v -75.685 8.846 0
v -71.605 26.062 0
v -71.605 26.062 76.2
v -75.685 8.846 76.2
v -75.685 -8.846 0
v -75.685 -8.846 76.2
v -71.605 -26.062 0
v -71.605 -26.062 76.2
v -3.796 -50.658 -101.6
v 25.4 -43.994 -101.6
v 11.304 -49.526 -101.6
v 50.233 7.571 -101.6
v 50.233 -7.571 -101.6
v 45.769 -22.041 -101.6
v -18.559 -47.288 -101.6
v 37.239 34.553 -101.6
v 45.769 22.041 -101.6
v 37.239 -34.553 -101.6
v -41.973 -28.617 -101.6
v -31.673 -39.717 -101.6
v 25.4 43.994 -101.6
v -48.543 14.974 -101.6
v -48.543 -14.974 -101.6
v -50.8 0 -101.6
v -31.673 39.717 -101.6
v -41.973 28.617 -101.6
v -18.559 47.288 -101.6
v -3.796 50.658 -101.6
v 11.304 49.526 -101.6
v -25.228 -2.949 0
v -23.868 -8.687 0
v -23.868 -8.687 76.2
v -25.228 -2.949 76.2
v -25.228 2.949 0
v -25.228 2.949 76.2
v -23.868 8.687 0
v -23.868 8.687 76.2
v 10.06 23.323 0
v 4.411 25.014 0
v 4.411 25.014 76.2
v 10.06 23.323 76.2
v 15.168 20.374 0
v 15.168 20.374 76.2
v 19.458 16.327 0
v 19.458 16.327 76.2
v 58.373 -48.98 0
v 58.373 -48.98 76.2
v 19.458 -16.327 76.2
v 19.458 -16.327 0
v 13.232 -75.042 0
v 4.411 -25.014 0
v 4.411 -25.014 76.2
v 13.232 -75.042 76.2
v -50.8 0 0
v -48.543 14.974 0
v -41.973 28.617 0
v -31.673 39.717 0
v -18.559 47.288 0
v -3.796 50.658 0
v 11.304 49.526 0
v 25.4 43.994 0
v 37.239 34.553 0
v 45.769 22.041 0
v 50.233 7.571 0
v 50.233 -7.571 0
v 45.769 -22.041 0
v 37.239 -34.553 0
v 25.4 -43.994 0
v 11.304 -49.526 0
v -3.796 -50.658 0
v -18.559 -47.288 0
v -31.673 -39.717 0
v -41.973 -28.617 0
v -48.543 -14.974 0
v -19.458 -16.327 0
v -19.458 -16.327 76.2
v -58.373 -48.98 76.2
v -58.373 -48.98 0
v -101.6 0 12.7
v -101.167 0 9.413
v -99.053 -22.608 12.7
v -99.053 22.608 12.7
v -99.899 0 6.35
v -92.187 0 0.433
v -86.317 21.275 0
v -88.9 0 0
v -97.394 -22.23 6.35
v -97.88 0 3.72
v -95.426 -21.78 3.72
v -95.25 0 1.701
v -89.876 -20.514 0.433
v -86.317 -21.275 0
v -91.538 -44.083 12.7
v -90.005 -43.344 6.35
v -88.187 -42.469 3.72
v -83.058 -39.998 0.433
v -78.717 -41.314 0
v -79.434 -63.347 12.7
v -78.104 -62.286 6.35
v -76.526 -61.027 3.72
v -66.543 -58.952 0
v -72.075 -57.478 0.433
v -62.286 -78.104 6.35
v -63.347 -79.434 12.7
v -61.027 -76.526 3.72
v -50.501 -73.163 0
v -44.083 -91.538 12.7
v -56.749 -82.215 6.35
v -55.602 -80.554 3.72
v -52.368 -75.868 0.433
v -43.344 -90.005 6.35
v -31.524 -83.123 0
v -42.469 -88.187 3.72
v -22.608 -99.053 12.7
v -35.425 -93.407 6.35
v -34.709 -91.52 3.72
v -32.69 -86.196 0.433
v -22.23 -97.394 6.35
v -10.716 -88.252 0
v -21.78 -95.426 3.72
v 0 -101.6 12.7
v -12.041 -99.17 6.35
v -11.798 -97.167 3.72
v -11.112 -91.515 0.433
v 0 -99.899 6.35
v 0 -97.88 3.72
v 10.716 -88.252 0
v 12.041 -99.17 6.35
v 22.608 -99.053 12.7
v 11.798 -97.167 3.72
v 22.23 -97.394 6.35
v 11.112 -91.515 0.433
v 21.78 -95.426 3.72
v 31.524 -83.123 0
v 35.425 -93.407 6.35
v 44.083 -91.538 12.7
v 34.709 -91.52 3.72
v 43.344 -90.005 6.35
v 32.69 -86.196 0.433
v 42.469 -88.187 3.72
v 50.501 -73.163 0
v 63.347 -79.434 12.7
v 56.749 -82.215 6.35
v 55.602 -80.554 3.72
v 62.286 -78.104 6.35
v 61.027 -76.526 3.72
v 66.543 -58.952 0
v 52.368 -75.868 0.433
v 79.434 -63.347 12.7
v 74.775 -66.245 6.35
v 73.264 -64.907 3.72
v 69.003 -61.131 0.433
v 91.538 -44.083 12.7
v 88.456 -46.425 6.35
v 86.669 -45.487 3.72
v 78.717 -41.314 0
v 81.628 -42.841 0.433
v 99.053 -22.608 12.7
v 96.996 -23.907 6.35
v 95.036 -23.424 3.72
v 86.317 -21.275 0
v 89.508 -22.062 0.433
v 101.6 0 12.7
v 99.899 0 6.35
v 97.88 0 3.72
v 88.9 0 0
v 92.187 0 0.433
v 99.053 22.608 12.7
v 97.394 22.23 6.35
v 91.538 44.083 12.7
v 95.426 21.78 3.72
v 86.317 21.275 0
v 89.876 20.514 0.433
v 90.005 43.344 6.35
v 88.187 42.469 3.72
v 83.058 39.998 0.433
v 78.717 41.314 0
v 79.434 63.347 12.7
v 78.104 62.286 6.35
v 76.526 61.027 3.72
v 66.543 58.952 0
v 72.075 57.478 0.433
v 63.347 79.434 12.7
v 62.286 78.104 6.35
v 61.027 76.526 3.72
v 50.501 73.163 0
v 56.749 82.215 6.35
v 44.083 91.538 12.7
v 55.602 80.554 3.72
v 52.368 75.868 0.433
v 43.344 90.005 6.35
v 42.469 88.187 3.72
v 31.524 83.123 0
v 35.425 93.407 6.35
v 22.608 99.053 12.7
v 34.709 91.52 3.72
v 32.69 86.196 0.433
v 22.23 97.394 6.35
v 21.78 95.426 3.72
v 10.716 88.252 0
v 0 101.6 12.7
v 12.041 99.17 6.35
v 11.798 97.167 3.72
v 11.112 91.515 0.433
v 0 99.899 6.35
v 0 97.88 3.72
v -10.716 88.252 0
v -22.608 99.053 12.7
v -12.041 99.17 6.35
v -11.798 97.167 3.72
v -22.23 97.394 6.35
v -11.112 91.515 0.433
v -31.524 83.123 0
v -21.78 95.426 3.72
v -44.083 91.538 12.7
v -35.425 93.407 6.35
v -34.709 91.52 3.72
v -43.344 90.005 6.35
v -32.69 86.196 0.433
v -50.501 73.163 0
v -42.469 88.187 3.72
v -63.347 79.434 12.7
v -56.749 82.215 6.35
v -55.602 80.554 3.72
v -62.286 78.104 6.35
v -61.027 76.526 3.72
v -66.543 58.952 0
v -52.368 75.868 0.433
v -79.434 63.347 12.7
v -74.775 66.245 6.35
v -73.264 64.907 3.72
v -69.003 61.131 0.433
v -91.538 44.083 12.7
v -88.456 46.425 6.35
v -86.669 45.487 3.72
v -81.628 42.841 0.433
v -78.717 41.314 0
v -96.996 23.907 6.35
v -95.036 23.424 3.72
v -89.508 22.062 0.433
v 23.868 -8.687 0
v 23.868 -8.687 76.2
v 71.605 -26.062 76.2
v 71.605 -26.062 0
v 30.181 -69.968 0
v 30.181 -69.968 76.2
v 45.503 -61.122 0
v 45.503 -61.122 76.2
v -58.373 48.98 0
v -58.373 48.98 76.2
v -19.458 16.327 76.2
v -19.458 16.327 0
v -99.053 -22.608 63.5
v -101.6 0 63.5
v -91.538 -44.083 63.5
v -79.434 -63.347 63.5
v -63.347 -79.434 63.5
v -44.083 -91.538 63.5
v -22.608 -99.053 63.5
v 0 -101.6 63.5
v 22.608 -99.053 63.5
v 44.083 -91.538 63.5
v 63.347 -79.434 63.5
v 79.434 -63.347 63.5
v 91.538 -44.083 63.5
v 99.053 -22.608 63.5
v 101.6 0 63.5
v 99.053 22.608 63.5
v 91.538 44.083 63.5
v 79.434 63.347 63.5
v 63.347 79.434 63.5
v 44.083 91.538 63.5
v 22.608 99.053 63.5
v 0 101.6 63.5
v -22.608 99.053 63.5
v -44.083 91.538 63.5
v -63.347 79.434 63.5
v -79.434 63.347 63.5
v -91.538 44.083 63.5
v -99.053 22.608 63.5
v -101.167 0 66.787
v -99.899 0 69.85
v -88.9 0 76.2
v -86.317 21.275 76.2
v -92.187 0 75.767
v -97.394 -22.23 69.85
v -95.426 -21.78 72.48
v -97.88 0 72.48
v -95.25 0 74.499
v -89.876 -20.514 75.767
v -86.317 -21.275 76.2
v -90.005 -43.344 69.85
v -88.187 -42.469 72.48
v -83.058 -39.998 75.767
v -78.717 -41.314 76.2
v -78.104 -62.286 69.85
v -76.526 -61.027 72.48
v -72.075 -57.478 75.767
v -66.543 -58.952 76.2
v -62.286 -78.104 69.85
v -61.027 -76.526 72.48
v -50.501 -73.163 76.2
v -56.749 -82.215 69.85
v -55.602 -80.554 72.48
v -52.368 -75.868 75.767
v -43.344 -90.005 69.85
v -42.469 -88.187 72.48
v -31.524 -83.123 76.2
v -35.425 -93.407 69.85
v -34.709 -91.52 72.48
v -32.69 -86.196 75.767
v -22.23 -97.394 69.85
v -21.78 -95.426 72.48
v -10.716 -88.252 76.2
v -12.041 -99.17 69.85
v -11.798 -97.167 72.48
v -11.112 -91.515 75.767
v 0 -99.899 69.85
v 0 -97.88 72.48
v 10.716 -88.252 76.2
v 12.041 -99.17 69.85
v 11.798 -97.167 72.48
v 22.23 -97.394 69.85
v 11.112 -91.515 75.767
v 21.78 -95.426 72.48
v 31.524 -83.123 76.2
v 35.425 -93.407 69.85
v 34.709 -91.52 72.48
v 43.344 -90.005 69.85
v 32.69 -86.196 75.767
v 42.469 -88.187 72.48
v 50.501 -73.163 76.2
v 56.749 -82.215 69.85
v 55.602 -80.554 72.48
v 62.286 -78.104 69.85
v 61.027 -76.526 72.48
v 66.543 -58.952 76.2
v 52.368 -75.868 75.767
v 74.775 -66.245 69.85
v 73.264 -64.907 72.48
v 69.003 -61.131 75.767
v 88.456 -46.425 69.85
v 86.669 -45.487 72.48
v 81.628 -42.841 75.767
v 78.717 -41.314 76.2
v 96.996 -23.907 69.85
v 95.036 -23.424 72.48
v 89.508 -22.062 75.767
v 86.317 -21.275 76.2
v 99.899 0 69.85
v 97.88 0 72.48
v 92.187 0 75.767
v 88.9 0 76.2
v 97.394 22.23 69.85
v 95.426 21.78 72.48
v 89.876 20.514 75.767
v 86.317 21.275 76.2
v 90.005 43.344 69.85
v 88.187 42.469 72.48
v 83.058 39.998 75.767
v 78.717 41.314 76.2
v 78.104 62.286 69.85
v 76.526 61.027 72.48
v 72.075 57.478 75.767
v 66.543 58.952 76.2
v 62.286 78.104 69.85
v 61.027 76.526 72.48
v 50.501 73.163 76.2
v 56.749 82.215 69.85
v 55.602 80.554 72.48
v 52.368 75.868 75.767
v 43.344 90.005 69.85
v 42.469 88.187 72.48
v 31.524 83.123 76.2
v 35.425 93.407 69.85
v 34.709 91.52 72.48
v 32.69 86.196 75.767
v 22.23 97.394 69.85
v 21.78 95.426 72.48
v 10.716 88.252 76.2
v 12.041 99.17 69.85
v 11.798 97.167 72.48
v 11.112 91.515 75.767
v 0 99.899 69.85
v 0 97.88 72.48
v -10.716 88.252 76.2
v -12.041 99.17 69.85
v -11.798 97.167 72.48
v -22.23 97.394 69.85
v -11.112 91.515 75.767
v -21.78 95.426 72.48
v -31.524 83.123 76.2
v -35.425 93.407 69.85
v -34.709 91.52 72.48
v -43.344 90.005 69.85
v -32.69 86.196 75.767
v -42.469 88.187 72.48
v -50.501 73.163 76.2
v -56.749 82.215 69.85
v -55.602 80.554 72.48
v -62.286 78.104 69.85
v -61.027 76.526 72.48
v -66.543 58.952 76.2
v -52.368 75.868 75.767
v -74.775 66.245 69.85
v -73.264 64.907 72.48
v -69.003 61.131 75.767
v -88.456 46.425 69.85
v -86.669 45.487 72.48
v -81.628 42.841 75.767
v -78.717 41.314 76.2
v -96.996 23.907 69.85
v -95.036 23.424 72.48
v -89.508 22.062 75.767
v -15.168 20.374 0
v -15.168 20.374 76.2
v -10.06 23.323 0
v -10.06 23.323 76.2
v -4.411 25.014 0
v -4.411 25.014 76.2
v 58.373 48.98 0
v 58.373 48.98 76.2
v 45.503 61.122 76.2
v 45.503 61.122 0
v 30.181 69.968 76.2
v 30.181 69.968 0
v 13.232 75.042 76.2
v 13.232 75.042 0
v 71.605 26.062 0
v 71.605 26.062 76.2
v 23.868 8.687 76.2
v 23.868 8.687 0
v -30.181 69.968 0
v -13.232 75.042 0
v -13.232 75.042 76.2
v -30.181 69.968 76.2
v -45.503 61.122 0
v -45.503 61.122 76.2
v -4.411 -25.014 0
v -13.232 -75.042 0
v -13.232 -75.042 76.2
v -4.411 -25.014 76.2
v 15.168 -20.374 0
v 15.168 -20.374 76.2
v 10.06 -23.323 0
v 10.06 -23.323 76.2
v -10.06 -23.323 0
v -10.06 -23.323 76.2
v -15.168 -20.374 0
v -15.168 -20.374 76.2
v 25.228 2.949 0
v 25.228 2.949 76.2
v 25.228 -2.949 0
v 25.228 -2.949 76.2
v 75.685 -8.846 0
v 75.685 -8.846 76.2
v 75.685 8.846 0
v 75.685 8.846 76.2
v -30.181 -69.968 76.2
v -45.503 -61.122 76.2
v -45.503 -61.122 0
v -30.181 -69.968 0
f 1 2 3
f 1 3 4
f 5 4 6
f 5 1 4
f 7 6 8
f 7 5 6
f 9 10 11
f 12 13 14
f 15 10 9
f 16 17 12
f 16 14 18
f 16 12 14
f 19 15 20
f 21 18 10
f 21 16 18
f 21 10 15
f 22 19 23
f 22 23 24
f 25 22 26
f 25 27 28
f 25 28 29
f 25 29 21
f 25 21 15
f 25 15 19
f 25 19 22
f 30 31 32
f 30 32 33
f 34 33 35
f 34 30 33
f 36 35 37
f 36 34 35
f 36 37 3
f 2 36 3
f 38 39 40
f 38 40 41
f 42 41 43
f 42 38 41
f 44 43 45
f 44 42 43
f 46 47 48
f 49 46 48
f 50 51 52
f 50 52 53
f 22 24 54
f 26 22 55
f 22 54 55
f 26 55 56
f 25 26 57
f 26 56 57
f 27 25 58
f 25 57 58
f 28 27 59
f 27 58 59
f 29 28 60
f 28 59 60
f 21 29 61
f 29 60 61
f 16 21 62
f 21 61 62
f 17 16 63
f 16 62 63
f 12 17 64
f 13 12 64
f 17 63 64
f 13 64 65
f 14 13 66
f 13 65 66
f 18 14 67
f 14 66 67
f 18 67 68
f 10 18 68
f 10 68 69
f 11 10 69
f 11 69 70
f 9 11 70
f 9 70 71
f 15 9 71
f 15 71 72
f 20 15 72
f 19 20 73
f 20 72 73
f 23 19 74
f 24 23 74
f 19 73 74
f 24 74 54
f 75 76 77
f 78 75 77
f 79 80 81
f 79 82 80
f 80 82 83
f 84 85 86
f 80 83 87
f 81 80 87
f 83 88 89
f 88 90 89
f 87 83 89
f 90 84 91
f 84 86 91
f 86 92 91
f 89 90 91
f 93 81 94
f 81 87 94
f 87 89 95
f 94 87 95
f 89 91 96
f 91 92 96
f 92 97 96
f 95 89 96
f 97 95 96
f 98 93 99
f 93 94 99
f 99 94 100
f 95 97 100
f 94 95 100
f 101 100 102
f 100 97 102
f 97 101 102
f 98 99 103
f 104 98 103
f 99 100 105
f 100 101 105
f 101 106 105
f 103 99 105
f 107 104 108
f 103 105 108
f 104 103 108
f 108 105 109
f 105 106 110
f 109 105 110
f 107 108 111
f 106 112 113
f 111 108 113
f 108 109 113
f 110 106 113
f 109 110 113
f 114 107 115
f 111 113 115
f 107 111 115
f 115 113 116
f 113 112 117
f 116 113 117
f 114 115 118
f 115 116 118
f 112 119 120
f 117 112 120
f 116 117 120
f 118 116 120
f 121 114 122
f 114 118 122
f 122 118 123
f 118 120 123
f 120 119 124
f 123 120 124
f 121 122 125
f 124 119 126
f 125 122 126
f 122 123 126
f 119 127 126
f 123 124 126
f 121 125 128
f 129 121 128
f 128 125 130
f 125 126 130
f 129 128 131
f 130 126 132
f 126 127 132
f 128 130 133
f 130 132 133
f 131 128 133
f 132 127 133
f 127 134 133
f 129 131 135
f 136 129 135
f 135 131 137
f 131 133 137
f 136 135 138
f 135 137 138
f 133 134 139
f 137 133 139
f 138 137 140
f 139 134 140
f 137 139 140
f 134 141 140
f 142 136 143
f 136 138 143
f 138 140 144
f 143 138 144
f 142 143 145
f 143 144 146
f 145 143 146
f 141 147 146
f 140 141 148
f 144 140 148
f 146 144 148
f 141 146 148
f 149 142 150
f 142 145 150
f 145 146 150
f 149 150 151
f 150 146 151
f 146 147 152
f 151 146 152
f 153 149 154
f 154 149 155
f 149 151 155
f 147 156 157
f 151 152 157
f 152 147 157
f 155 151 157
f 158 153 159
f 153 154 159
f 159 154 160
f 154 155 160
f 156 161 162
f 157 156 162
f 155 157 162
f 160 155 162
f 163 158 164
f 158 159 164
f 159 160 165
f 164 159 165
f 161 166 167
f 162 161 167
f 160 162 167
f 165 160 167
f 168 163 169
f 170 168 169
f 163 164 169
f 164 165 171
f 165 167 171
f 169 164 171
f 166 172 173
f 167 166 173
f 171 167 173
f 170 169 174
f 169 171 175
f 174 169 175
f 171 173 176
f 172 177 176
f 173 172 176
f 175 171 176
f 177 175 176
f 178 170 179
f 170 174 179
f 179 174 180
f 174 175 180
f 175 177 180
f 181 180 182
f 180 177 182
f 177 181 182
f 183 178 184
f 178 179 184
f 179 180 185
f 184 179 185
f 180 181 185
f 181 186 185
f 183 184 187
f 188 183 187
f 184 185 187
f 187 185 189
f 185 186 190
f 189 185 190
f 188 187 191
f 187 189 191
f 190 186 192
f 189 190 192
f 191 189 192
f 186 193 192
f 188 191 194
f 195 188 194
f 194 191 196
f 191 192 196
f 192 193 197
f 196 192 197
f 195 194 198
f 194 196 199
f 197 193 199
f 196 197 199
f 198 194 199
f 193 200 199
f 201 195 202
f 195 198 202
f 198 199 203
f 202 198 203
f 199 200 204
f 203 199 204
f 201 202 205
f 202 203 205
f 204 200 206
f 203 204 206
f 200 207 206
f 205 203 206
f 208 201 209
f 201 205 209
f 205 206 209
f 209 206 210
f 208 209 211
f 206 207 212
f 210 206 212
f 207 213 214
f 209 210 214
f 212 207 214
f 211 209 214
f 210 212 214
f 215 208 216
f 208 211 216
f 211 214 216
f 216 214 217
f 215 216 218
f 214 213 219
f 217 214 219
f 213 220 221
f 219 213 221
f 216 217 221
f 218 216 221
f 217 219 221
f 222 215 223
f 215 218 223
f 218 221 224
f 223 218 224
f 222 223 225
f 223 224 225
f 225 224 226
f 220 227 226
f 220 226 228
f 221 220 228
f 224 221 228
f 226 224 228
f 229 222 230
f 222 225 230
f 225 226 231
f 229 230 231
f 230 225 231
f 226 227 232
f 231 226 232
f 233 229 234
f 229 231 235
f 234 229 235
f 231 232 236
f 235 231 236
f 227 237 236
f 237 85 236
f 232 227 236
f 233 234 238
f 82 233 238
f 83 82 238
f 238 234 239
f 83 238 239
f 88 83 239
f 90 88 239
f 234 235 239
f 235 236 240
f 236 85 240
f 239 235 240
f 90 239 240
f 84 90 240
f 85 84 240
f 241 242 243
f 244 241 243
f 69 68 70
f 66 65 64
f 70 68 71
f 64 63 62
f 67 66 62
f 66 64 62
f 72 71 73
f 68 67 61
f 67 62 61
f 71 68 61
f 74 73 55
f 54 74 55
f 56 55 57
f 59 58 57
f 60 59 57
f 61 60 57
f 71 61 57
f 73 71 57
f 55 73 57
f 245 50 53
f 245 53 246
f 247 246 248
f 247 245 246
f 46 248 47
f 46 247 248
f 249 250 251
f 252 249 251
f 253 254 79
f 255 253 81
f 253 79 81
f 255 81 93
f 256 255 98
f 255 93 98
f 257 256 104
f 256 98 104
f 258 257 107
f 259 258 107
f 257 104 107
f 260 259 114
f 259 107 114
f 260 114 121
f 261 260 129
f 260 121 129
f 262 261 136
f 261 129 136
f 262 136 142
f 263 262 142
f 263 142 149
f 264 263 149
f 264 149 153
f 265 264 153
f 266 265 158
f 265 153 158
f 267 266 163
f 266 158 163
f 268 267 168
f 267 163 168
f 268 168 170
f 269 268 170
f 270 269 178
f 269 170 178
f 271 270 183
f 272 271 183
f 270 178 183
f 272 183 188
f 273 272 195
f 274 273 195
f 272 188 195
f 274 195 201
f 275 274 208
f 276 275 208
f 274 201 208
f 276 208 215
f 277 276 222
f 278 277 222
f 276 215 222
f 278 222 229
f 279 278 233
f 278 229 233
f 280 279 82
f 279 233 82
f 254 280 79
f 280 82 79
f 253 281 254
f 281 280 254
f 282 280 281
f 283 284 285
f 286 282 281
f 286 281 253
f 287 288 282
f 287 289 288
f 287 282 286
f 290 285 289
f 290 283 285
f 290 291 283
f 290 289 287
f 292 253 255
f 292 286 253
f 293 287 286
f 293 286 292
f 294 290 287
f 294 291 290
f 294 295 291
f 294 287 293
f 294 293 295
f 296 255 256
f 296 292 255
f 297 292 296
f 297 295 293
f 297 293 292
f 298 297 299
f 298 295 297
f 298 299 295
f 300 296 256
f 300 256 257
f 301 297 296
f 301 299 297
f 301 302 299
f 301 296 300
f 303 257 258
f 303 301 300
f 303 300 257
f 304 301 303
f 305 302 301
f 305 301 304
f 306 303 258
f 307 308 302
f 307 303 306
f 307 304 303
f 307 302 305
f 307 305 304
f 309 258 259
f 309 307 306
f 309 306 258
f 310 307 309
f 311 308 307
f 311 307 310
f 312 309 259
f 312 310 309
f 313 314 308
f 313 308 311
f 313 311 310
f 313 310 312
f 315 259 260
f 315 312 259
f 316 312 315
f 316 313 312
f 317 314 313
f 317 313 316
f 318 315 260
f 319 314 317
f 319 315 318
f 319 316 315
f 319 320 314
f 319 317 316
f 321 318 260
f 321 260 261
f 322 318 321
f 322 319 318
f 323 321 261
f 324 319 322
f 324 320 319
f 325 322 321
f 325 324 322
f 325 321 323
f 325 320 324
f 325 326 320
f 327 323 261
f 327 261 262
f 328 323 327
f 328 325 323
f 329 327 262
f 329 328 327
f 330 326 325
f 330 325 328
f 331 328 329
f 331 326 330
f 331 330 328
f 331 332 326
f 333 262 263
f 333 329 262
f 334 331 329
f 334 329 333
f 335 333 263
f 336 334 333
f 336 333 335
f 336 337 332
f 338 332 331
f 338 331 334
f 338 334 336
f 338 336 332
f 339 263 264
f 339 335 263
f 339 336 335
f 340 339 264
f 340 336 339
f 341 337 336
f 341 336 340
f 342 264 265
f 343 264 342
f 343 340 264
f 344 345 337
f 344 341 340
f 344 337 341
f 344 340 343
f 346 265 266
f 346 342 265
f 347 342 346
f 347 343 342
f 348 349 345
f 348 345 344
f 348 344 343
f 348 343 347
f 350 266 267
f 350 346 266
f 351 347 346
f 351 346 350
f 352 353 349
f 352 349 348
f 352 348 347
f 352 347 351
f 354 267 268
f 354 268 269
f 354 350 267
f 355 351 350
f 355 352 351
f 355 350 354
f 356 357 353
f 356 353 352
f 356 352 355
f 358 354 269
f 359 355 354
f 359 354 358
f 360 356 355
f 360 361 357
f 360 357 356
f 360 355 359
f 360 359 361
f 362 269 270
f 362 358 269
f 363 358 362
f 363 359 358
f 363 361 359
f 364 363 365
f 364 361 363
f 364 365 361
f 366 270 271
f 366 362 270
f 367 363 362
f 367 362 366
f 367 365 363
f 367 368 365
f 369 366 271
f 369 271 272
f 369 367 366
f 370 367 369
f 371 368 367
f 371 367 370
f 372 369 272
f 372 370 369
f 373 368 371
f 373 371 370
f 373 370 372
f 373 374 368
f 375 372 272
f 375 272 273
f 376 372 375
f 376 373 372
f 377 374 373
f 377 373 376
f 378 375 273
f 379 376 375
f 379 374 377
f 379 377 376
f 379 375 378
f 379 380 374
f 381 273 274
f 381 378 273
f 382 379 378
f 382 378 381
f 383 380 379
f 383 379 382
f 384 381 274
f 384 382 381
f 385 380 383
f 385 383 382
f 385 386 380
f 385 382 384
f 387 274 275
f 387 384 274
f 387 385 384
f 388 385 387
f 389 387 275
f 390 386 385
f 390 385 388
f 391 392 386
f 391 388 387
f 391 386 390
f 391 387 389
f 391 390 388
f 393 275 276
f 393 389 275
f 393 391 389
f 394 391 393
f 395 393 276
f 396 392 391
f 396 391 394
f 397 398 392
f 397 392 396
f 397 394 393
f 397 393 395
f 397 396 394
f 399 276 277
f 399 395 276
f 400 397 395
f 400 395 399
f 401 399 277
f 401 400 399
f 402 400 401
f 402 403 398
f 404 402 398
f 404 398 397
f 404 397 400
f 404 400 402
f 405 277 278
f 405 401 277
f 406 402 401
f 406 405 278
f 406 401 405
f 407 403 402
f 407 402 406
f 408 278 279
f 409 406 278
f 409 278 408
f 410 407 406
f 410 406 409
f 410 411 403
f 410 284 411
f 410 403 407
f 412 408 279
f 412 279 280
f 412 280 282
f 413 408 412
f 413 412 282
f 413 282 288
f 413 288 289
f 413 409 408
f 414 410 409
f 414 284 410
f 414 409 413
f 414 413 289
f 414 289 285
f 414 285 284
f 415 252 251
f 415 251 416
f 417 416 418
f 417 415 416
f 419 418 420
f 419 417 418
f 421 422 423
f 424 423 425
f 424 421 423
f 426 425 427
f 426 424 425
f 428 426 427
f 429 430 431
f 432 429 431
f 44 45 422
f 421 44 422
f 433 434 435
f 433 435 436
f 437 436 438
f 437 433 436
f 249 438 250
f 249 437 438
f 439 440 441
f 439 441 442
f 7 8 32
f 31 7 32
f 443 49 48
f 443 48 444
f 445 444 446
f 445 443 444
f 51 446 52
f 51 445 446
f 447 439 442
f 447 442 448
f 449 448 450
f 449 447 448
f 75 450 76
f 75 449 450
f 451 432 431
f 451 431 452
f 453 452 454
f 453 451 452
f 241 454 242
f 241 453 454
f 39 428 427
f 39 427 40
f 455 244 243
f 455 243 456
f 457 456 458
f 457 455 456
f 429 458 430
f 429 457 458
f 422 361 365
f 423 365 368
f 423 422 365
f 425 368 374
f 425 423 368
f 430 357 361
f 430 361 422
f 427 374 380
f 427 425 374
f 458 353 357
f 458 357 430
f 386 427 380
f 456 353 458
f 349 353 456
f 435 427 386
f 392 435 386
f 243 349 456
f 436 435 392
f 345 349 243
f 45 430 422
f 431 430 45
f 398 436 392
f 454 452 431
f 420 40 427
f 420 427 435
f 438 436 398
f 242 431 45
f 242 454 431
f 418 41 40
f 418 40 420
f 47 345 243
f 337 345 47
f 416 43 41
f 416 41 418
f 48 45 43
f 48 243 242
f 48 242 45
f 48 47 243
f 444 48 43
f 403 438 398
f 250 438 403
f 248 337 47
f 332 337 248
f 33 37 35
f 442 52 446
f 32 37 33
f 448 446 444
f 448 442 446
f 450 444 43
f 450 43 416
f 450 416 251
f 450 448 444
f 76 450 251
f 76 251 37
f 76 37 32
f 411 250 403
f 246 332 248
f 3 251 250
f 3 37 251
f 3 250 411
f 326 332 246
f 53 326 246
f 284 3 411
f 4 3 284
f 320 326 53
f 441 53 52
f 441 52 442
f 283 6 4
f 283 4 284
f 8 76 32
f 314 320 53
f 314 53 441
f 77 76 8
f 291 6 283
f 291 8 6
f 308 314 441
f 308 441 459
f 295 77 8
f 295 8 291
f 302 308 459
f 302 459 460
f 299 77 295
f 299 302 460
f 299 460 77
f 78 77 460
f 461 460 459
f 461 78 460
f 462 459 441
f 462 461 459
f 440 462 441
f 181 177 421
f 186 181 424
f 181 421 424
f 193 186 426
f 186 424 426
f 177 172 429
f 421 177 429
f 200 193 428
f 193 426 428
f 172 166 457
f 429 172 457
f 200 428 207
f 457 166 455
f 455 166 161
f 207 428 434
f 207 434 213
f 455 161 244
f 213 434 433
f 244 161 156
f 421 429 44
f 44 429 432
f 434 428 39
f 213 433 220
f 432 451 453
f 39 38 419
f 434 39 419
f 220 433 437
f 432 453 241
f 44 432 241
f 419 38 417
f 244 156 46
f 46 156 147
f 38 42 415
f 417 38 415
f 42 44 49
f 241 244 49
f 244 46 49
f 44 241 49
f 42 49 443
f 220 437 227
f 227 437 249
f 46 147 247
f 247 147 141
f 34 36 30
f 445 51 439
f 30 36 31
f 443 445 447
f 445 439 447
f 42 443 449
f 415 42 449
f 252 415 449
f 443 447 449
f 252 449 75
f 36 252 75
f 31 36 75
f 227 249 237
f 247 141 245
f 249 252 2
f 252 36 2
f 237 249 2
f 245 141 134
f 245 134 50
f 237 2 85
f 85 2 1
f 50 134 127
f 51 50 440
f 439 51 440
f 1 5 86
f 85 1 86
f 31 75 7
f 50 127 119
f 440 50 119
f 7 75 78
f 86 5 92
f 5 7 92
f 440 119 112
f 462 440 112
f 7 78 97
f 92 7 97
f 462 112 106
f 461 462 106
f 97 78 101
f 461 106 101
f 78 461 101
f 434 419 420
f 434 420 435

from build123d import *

# Parameters (mm, degrees)
SKETCH1_R           = 101.6
BOSS_EXTRUDE2_DEPTH = 76.2
CUT_EXTRUDE1_REACH  = 164.639
FILLET1_R           = 12.7
SKETCH6_R           = 50.8
BOSS_EXTRUDE4_DEPTH = 101.6


with BuildPart() as part:
    # Sketch1 → Boss-Extrude2 (new body)
    with BuildSketch(Plane.XY):
        with Locations(Location((0, 0, 0), (0, 0, 180))):
            Circle(SKETCH1_R)
    extrude(amount=BOSS_EXTRUDE2_DEPTH)

    # Sketch5 → Cut-Extrude1 (cut, up to next)
    with BuildSketch(Plane(origin=(0, 0, 0), x_dir=(-1, 0, 0), z_dir=(0, 0, -1)), mode=Mode.PRIVATE) as cut_extrude1_sk1:
        with BuildLine():
            Line((23.868192568, 8.68731164), (71.604577704, 26.061934921))
            ThreePointArc((71.604577704, 26.061934921), (76.2, 0), (71.604577704, -26.061934921))
            Line((71.604577704, -26.061934921), (23.868192568, -8.68731164))
            ThreePointArc((23.868192568, -8.68731164), (25.4, 0), (23.868192568, 8.68731164))
        make_face()
    cut_extrude1_tool1 = extrude(cut_extrude1_sk1.sketch, amount=-CUT_EXTRUDE1_REACH, mode=Mode.PRIVATE) & part.part
    # Sketch5 → Cut-Extrude1 (cut, up to next)
    with BuildSketch(Plane(origin=(0, 0, 0), x_dir=(-1, 0, 0), z_dir=(0, 0, -1)), mode=Mode.PRIVATE) as cut_extrude1_sk2:
        with BuildLine():
            Line((19.457528855, -16.326805286), (58.372586566, -48.980415858))
            ThreePointArc((58.372586566, -48.980415858), (38.1, -65.991135768), (13.231991138, -75.04235078))
            Line((13.231991138, -75.04235078), (4.410663713, -25.014116927))
            ThreePointArc((4.410663713, -25.014116927), (12.7, -21.997045256), (19.457528855, -16.326805286))
        make_face()
    cut_extrude1_tool2 = extrude(cut_extrude1_sk2.sketch, amount=-CUT_EXTRUDE1_REACH, mode=Mode.PRIVATE) & part.part
    # Sketch5 → Cut-Extrude1 (cut, up to next)
    with BuildSketch(Plane(origin=(0, 0, 0), x_dir=(-1, 0, 0), z_dir=(0, 0, -1)), mode=Mode.PRIVATE) as cut_extrude1_sk3:
        with BuildLine():
            Line((-4.410663713, -25.014116927), (-13.231991138, -75.04235078))
            ThreePointArc((-13.231991138, -75.04235078), (-38.1, -65.991135768), (-58.372586566, -48.980415858))
            Line((-58.372586566, -48.980415858), (-19.457528855, -16.326805286))
            ThreePointArc((-19.457528855, -16.326805286), (-12.7, -21.997045256), (-4.410663713, -25.014116927))
        make_face()
    cut_extrude1_tool3 = extrude(cut_extrude1_sk3.sketch, amount=-CUT_EXTRUDE1_REACH, mode=Mode.PRIVATE) & part.part
    # Sketch5 → Cut-Extrude1 (cut, up to next)
    with BuildSketch(Plane(origin=(0, 0, 0), x_dir=(-1, 0, 0), z_dir=(0, 0, -1)), mode=Mode.PRIVATE) as cut_extrude1_sk4:
        with BuildLine():
            Line((-23.868192568, -8.68731164), (-71.604577704, -26.061934921))
            ThreePointArc((-71.604577704, -26.061934921), (-76.2, 0), (-71.604577704, 26.061934921))
            Line((-71.604577704, 26.061934921), (-23.868192568, 8.68731164))
            ThreePointArc((-23.868192568, 8.68731164), (-25.4, 0), (-23.868192568, -8.68731164))
        make_face()
    cut_extrude1_tool4 = extrude(cut_extrude1_sk4.sketch, amount=-CUT_EXTRUDE1_REACH, mode=Mode.PRIVATE) & part.part
    # Sketch5 → Cut-Extrude1 (cut, up to next)
    with BuildSketch(Plane(origin=(0, 0, 0), x_dir=(-1, 0, 0), z_dir=(0, 0, -1)), mode=Mode.PRIVATE) as cut_extrude1_sk5:
        with BuildLine():
            Line((-19.457528855, 16.326805286), (-58.372586566, 48.980415858))
            ThreePointArc((-58.372586566, 48.980415858), (-38.1, 65.991135768), (-13.231991138, 75.04235078))
            Line((-13.231991138, 75.04235078), (-4.410663713, 25.014116927))
            ThreePointArc((-4.410663713, 25.014116927), (-12.7, 21.997045256), (-19.457528855, 16.326805286))
        make_face()
    cut_extrude1_tool5 = extrude(cut_extrude1_sk5.sketch, amount=-CUT_EXTRUDE1_REACH, mode=Mode.PRIVATE) & part.part
    # Sketch5 → Cut-Extrude1 (cut, up to next)
    with BuildSketch(Plane(origin=(0, 0, 0), x_dir=(-1, 0, 0), z_dir=(0, 0, -1)), mode=Mode.PRIVATE) as cut_extrude1_sk6:
        with BuildLine():
            Line((4.410663713, 25.014116927), (13.231991138, 75.04235078))
            ThreePointArc((13.231991138, 75.04235078), (38.1, 65.991135768), (58.372586566, 48.980415858))
            Line((58.372586566, 48.980415858), (19.457528855, 16.326805286))
            ThreePointArc((19.457528855, 16.326805286), (12.7, 21.997045256), (4.410663713, 25.014116927))
        make_face()
    cut_extrude1_tool6 = extrude(cut_extrude1_sk6.sketch, amount=-CUT_EXTRUDE1_REACH, mode=Mode.PRIVATE) & part.part
    add(cut_extrude1_tool1.solids().sort_by_distance((-53.922515, 0, 0))[0], mode=Mode.SUBTRACT)
    add(cut_extrude1_tool2.solids().sort_by_distance((-26.961258, -46.698268, 0))[0], mode=Mode.SUBTRACT)
    add(cut_extrude1_tool3.solids().sort_by_distance((26.961258, -46.698268, 0))[0], mode=Mode.SUBTRACT)
    add(cut_extrude1_tool4.solids().sort_by_distance((53.922515, 0, 0))[0], mode=Mode.SUBTRACT)
    add(cut_extrude1_tool5.solids().sort_by_distance((26.961258, 46.698268, 0))[0], mode=Mode.SUBTRACT)
    add(cut_extrude1_tool6.solids().sort_by_distance((-26.961258, 46.698268, 0))[0], mode=Mode.SUBTRACT)

    # Fillet1
    fillet1_edges = [part.edges().sort_by_distance(p)[0] for p in [
        (101.6, 0, 0),
        (101.6, 0, 76.2),
    ]]
    fillet(fillet1_edges, radius=FILLET1_R)


with BuildPart() as body_2:
    # Sketch6 → Boss-Extrude4 (new body)
    with BuildSketch(Plane(origin=(0, 0, 0), x_dir=(-1, 0, 0), z_dir=(0, 0, -1))):
        Circle(SKETCH6_R)
    extrude(amount=BOSS_EXTRUDE4_DEPTH)


solid = Compound([part.part, body_2.part])
